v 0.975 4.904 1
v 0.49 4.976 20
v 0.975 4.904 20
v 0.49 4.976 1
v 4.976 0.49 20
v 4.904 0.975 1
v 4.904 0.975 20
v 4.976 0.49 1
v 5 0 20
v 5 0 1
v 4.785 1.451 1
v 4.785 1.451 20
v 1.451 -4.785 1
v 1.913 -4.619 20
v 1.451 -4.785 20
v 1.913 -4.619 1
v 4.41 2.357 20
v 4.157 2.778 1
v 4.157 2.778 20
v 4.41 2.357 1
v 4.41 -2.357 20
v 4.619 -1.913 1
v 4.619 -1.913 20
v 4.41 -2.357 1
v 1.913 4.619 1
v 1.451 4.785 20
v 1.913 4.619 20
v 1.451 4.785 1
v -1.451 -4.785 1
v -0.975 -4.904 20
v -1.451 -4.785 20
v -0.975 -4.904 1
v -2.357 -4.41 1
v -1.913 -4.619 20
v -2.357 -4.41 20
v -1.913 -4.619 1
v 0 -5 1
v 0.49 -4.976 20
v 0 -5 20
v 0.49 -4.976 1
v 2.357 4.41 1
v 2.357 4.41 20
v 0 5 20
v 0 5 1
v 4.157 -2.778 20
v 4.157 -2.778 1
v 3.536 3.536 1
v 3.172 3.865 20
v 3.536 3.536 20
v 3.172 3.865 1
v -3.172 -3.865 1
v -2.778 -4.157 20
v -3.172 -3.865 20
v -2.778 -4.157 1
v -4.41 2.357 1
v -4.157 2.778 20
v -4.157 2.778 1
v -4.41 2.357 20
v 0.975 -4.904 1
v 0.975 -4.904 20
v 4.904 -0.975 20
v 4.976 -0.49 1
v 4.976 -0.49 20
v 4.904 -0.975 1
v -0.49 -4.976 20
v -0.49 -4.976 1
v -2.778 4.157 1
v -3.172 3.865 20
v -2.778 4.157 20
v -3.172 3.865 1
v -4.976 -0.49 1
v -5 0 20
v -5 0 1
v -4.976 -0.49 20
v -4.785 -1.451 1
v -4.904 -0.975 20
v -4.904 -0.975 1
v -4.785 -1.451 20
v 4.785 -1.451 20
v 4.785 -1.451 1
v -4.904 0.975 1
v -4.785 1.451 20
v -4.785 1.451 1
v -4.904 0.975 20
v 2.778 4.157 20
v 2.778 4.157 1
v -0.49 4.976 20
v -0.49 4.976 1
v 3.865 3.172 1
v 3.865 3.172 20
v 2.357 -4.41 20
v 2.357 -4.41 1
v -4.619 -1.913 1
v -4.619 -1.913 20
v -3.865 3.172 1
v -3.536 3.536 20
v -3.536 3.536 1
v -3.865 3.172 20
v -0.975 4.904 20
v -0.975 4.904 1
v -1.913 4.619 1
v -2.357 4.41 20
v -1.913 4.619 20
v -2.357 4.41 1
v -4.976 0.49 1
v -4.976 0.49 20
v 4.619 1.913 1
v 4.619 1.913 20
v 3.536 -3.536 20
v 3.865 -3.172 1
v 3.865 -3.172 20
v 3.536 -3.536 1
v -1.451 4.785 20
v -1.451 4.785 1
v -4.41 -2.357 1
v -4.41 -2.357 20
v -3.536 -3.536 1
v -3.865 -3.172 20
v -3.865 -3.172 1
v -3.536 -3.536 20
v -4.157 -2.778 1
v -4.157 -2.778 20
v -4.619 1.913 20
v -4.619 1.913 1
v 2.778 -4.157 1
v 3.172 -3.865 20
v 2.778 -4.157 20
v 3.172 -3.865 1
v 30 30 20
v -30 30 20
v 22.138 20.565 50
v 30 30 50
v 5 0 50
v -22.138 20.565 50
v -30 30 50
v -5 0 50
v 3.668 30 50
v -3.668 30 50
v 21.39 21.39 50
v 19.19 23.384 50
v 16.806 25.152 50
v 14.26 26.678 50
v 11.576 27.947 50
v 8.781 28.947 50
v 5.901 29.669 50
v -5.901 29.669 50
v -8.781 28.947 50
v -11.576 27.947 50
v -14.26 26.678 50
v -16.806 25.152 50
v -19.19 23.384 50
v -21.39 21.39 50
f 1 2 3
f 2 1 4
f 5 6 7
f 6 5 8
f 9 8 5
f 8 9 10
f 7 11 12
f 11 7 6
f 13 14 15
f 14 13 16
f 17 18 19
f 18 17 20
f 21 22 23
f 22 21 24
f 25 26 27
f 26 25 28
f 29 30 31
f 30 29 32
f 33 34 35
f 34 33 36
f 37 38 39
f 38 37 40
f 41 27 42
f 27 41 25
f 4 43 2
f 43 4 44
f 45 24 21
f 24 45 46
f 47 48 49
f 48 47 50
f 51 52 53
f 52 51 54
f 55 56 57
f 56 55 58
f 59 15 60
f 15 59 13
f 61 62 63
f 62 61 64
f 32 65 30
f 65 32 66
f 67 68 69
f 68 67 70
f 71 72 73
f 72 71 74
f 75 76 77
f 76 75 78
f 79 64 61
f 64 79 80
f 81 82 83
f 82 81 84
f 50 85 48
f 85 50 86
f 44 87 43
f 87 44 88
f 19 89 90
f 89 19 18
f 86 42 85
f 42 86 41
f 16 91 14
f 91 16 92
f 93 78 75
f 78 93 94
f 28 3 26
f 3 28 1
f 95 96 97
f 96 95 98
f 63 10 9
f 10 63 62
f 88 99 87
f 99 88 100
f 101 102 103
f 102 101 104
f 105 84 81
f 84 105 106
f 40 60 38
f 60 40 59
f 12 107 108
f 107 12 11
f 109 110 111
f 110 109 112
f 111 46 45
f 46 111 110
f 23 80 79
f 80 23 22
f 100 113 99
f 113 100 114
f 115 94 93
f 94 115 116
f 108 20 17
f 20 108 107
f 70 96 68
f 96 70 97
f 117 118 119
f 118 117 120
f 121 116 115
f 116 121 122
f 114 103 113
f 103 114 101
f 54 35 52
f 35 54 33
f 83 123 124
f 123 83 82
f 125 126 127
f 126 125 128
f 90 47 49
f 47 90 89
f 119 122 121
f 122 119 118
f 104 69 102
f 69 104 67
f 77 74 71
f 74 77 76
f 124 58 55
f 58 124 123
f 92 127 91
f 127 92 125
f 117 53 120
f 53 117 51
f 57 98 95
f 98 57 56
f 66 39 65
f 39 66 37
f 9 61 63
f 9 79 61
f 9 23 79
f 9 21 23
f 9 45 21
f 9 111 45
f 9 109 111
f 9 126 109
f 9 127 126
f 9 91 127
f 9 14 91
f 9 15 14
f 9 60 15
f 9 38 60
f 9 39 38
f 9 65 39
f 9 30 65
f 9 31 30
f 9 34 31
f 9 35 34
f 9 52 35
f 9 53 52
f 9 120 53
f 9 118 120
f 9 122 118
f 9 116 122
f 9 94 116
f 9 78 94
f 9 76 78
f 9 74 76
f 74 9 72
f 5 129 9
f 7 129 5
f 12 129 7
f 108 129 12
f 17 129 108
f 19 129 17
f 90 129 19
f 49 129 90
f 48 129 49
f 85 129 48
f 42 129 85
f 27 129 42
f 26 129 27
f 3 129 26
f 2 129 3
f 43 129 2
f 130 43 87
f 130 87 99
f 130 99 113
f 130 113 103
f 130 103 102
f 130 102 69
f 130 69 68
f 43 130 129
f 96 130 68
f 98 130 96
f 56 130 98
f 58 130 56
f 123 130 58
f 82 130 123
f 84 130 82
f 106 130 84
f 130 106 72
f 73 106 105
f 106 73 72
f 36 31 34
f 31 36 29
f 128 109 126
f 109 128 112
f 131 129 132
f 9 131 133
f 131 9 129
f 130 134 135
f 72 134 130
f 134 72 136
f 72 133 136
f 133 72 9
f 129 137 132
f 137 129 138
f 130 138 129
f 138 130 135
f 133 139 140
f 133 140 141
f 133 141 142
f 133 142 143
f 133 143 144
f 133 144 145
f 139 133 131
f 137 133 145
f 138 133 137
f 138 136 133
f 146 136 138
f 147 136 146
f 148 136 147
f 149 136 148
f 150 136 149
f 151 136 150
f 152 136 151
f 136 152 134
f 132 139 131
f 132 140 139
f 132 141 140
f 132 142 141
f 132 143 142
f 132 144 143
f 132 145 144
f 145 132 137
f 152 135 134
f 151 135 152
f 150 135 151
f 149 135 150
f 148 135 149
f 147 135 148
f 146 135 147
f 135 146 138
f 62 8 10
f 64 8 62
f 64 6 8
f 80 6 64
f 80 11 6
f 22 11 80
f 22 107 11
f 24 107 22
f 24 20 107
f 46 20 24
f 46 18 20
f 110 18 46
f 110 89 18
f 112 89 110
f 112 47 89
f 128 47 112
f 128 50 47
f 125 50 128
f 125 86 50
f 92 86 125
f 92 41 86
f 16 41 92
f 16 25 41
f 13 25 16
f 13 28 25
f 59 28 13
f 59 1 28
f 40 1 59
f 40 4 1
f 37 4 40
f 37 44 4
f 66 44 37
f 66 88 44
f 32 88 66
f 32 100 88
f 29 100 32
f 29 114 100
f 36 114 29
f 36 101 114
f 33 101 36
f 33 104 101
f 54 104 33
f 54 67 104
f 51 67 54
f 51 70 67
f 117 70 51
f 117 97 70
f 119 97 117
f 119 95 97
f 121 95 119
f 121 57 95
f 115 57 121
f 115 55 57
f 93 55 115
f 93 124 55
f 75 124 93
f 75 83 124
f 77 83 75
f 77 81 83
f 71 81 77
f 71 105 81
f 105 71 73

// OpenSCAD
// Lab Funnel - A straight spout tube with a conical funnel body, open at top and bottom.
// Printed upright with the wide opening at the top.

// Dimensions
spout_od    = 10;      // Outer diameter of straight spout
spout_id    = 6.8;     // Inner diameter of straight spout (10 - 2*1.6)
spout_len   = 20;      // Length of straight spout (z=0 to z=20)
funnel_start_od = 10;  // Outer diameter at start of cone (z=20)
funnel_end_od  = 60;   // Outer diameter at rim (z=50)
funnel_len    = 30;    // Length of cone section (50 - 20)
wall_thick    = 1.6;   // Wall thickness everywhere

// Derived dimensions
funnel_start_id = funnel_start_od - 2 * wall_thick; // 6.8
funnel_end_id   = funnel_end_od - 2 * wall_thick;  // 52.8

$fn = 64;

// Build the solid part
difference() {
    union() {
        // 1. Straight Spout (Tube)
        // Outer cylinder
        translate([0, 0, 0]) 
            cylinder(h = spout_len, d = spout_od);
        
        // Inner cylinder (hole)
        translate([0, 0, 0]) 
            cylinder(h = spout_len, d = spout_id);

        // 2. Conical Funnel Body
        // Outer cone
        translate([0, 0, spout_len]) 
            linear_extrude(height = funnel_len) 
                polygon([
                    [spout_od / 2, 0],
                    [funnel_end_od / 2, funnel_len],
                    [-funnel_end_od / 2, funnel_len],
                    [-spout_od / 2, 0]
                ]);
        
        // Inner cone (hole)
        translate([0, 0, spout_len]) 
            linear_extrude(height = funnel_len) 
                polygon([
                    [spout_id / 2, 0],
                    [funnel_end_id / 2, funnel_len],
                    [-funnel_end_id / 2, funnel_len],
                    [-spout_id / 2, 0]
                ]);
    }
    
    // Cut the top opening (rim)
    // Extend slightly past the rim to ensure clean cut
    translate([0, 0, spout_len + funnel_len]) 
        cylinder(h = 2, d = funnel_end_od + 0.5);
    
    // Cut the bottom opening (spout tip)
    // Extend slightly past the tip to ensure clean cut
    translate([0, 0, -1]) 
        cylinder(h = 2, d = spout_od + 0.5);
}
